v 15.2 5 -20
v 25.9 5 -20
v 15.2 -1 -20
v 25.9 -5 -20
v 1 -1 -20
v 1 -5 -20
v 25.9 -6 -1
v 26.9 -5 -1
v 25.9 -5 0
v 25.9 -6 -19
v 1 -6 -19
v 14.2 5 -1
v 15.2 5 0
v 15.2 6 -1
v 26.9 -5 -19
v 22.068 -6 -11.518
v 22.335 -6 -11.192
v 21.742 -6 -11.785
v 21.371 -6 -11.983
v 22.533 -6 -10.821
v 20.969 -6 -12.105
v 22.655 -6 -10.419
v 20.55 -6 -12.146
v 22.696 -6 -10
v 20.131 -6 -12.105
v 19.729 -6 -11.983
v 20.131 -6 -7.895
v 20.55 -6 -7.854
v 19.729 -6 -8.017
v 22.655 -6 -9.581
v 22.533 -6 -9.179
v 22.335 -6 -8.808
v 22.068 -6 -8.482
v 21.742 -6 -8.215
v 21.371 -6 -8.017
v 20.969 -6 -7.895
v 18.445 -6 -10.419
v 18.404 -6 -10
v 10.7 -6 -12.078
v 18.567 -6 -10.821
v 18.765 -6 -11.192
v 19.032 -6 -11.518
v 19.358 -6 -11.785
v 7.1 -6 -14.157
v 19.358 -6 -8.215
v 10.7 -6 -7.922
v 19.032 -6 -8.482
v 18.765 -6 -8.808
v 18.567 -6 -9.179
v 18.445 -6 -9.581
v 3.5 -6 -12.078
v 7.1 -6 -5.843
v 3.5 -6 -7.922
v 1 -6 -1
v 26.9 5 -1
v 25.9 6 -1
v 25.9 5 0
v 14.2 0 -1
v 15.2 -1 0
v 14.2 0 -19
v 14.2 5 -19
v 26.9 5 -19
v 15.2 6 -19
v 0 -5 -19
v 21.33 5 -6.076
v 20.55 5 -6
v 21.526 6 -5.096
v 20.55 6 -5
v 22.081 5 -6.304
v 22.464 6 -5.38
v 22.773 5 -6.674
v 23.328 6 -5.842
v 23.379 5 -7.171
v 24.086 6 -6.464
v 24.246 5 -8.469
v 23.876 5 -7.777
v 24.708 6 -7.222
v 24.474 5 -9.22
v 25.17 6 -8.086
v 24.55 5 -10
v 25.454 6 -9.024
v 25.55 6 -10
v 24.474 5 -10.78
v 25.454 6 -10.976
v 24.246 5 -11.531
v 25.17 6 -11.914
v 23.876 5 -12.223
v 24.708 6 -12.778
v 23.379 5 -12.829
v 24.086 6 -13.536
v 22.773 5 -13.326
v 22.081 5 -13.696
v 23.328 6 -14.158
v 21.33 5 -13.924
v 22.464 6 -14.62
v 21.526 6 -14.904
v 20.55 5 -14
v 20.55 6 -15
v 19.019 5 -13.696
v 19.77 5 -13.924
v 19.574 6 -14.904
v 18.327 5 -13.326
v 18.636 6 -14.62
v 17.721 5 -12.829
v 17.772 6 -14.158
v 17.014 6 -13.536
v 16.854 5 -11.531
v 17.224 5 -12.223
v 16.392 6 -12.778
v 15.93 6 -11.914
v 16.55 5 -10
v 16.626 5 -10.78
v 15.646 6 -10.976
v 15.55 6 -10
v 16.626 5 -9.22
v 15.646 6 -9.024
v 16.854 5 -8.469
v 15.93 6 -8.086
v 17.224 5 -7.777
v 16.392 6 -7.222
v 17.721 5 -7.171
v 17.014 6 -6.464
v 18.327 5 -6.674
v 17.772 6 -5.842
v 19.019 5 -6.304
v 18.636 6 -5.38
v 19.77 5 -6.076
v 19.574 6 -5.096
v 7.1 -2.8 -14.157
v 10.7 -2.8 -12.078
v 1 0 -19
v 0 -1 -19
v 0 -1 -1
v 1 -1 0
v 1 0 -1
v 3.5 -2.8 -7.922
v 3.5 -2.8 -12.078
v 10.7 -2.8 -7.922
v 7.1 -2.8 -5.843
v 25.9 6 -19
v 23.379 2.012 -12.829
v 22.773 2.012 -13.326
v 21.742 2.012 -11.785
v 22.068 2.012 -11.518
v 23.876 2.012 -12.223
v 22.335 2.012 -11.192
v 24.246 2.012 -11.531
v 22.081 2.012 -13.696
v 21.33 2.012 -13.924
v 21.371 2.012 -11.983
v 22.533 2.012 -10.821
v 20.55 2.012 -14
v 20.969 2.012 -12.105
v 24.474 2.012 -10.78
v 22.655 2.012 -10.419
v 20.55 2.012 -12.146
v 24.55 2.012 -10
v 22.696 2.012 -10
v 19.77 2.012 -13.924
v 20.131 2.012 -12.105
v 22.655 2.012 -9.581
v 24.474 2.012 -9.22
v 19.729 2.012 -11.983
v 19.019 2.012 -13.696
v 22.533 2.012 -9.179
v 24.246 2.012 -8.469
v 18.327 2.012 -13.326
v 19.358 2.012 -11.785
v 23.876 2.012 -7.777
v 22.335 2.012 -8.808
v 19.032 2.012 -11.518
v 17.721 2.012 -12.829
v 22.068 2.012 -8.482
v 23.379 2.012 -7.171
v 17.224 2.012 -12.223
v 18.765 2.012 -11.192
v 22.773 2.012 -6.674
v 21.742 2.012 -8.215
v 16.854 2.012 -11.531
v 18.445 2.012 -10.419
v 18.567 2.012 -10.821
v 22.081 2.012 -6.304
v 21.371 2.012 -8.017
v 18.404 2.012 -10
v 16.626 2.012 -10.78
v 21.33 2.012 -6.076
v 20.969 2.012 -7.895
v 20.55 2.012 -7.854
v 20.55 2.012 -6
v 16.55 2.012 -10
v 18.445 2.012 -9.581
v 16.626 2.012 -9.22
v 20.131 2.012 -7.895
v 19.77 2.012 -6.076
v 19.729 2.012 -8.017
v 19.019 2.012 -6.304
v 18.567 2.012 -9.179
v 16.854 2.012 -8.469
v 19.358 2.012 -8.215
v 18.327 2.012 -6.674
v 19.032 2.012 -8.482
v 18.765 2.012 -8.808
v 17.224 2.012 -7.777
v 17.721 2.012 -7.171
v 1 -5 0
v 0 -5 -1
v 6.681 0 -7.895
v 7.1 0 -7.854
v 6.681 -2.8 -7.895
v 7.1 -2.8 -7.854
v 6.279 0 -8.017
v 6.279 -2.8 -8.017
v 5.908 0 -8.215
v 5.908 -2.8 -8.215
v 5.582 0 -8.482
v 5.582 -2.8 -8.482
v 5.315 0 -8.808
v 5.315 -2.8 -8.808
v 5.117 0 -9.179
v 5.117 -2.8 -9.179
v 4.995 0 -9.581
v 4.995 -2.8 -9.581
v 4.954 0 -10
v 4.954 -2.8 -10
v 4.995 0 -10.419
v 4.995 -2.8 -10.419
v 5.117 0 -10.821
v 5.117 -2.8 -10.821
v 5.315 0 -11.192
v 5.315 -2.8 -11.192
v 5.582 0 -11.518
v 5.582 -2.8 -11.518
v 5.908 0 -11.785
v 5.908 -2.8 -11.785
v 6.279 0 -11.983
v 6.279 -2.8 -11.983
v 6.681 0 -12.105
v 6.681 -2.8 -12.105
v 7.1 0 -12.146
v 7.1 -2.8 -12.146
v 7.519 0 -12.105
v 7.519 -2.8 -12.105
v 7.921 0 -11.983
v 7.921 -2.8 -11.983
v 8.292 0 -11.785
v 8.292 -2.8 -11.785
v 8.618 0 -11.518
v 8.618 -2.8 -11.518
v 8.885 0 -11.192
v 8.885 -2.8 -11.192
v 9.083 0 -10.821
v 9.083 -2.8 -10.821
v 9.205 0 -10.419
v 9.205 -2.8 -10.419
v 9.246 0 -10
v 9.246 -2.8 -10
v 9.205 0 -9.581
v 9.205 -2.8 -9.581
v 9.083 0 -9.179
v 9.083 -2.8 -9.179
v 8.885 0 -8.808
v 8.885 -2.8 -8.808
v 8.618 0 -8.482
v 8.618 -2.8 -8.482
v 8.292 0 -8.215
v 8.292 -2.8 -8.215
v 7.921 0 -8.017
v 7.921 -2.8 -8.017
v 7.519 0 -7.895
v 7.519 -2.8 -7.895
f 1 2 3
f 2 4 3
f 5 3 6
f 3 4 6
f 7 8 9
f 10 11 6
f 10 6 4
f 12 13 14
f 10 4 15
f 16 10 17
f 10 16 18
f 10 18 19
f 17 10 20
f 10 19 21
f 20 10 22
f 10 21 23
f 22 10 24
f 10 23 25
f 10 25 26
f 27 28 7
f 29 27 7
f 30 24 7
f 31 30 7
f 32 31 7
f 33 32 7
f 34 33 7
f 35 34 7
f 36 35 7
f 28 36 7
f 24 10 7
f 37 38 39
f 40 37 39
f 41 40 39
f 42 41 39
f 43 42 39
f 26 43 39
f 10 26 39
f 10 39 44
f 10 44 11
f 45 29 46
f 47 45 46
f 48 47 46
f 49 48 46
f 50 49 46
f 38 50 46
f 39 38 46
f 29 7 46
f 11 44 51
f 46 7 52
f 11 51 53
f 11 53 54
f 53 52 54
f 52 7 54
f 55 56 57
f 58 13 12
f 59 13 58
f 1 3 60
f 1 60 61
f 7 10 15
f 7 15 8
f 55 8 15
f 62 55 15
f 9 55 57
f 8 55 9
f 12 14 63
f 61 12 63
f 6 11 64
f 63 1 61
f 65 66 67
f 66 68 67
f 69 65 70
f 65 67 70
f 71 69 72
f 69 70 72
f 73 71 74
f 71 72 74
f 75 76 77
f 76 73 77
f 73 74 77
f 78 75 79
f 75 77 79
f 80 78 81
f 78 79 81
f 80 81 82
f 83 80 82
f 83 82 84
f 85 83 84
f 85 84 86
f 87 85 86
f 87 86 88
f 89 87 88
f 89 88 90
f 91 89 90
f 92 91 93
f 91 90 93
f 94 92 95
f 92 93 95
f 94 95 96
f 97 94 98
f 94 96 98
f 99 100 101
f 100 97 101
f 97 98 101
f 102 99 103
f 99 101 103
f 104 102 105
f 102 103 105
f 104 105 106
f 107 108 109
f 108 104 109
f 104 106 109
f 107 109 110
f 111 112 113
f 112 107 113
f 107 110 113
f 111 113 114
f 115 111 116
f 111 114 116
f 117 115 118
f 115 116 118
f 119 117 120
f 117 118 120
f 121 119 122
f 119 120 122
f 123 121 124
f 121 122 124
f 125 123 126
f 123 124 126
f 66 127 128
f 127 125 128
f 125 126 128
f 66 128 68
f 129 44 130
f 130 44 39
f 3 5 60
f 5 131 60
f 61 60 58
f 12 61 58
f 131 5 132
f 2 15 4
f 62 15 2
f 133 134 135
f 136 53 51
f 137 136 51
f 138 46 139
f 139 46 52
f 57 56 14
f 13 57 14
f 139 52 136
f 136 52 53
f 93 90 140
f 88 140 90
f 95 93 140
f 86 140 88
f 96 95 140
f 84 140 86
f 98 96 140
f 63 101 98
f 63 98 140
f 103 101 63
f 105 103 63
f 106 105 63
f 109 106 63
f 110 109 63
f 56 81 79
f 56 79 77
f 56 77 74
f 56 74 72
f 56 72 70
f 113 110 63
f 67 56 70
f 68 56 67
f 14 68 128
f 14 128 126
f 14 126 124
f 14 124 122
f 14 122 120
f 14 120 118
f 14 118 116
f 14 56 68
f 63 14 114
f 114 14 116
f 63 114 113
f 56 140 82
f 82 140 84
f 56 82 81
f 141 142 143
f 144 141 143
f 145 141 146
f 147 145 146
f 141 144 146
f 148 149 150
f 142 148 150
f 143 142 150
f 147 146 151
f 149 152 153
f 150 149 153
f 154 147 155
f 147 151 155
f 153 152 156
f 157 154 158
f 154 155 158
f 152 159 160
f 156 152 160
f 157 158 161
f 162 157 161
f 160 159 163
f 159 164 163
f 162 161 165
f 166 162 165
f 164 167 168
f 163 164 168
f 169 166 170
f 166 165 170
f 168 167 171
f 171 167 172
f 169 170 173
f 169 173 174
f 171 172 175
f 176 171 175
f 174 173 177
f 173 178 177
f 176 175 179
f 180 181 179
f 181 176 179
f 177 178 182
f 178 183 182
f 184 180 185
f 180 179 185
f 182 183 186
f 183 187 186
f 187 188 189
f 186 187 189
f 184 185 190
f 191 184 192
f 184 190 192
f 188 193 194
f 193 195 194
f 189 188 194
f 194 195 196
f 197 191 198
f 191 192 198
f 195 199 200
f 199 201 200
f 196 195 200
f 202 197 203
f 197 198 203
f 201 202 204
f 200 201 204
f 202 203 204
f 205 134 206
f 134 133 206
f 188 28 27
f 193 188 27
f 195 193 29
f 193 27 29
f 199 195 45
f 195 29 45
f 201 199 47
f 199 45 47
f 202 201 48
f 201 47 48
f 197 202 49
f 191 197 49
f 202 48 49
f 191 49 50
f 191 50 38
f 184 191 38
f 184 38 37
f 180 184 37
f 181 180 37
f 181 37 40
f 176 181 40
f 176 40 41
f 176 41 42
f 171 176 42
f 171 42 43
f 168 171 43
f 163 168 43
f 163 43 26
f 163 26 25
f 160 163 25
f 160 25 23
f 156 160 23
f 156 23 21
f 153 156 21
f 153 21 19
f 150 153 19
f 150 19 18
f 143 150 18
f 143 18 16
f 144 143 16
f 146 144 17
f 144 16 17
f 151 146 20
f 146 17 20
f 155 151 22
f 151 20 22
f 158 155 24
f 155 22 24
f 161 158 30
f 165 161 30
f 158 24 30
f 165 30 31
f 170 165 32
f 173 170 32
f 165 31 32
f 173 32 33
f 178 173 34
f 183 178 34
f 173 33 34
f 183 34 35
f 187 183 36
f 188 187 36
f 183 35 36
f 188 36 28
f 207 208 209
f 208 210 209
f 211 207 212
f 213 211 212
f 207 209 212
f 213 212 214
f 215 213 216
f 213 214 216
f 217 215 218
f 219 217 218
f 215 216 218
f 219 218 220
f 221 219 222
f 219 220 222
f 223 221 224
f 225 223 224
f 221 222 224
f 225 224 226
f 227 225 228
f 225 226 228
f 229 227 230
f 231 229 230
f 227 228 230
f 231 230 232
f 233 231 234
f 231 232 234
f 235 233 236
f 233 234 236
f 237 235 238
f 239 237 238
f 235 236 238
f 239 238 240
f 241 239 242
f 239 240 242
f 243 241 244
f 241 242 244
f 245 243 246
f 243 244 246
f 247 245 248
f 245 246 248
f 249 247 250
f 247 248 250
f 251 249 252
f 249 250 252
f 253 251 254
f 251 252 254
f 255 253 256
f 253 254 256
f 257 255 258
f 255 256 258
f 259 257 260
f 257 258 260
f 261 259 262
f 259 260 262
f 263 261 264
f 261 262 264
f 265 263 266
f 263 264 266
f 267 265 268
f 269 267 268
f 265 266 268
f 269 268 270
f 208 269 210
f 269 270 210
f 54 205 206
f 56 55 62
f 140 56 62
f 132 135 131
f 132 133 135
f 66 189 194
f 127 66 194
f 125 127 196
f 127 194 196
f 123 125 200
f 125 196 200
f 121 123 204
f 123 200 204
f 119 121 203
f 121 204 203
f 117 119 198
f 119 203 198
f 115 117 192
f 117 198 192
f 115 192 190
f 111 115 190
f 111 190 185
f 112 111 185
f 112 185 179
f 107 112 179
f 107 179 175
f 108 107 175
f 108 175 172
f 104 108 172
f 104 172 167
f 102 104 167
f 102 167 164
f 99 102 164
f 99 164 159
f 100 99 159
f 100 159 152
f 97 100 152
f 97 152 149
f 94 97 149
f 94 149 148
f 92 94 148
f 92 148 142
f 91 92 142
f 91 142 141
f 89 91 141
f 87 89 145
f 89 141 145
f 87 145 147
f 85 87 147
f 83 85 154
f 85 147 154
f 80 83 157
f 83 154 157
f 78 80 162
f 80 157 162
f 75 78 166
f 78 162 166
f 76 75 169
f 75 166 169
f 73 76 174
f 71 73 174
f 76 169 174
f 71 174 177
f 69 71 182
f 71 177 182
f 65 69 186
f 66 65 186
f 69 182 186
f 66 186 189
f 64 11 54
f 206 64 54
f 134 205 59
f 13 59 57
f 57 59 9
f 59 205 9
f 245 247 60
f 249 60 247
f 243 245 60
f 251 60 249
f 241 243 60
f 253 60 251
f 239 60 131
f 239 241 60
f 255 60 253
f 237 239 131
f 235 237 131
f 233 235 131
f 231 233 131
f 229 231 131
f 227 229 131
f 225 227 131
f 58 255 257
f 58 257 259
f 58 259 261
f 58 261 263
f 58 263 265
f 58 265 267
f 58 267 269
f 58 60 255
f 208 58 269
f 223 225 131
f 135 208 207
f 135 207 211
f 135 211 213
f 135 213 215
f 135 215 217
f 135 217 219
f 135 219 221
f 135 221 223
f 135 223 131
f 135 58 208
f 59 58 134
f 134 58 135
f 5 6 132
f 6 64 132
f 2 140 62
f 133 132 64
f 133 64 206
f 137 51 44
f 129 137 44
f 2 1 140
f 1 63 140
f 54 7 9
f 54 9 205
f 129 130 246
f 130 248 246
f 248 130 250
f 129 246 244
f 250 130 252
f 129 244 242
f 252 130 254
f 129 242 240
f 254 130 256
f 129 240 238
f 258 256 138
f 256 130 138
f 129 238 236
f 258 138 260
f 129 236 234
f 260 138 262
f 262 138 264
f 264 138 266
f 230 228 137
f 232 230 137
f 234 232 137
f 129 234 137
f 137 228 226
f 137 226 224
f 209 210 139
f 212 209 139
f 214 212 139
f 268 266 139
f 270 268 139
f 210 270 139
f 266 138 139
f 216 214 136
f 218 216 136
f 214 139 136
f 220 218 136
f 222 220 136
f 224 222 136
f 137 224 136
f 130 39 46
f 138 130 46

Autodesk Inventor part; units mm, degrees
ref_plane "YZ Plane" through (0, 0, 0) normal (1, 0, 0) x (0, 1, 0)
ref_plane "XZ Plane" through (0, 0, 0) normal (0, 1, 0) x (-1, 0, 0)
ref_plane "XY Plane" through (0, 0, 0) normal (0, 0, 1) x (1, 0, 0)
sketch "Base Sketch" plane through (0, 0, 0) normal (0, 1, 0) x (-1, 0, 0)
  line L0 (0, 0) -> (-26.9, 0)
  line L1 (-26.9, 0) -> (-26.9, -20)
  line L2 (-26.9, -20) -> (0, -20)
  line L3 (0, -20) -> (0, 0)
  line L4 (-14.2, -20) -> (-14.2, 0)
  line L5 (-10.6, -7.9793) -> (-7.1, -5.9585)
  line L6 (-7.1, -5.9585) -> (-3.6, -7.9793)
  line L7 (-3.6, -7.9793) -> (-3.6, -12.0207)
  line L8 (-3.6, -12.0207) -> (-7.1, -14.0415)
  line L9 (-7.1, -14.0415) -> (-10.6, -12.0207)
  line L10 (-10.6, -12.0207) -> (-10.6, -7.9793)
  point P0 (-20.55, -10)
  point P1 (-26.9, -10)
  point P2 (-7.1, -10)
  point P3 (0, -10)
  point P4 (-7.1, -10)
  dimension "d0" = 20
  dimension "d5" = 14.2
  dimension "d7" = 6.35
  dimension "d8" = 6.35
  dimension "d25" = 7.1
  dimension "d36" = 7
extrude "BasePlate" add sketch "Base Sketch" against normal blind 6 contours L3 L2 L4 L0 | L4 L2 L1 L0 | L5 L6 L7 L8 L9 L10
hole "Load Screw Hole" at (7.1, 0, -10) direction (0, -1, 0) diameter 4.2926 end through all clearance for "Socket Head Cap Screw" size "M4" standard "Ansi Metric M Profile"
extrude "Top Section" add sketch "Base Sketch" along normal blind 6 contours L4 L2 L1 L0
sketch "Sketch2" plane through (0, 6, 0) normal (0, 1, 0) x (1, 0, 0)
  point P0 (20.55, 10)
hole "Extrusion Mount Screw" at (20.55, 6, -10) direction (0, -1, 0) diameter 4.2926 end through all counterbore diameter 8.001 counterbore depth 3.9878 clearance for "Socket Head Cap Screw" size "M4" standard "Ansi Metric M Profile"
chamfer "Chamfer" distance 1 angle 45 18 edges at (7.1, 0, -20) (14.2, 3, -20) (20.55, 6, -20) (26.9, 6, -10) (20.55, 6, 0) (14.2, 3, 0) (7.1, 0, 0) (0, -3, 0) (26.9, 0, 0) (26.9, 0, -20) (13.45, -6, -20) (26.9, -6, -10) (13.45, -6, 0) (0, -6, -10) (0, -3, -20) (0, 0, -10) (14.2, 6, -10) (20.55, 6, -14.0005)
extrude "Hex Nut Slot" cut sketch "Base Sketch" along normal blind 3.2 from surface at -6 contours L5 L6 L7 L8 L9 L10
thicken "Nut Fit Clearance" operation cut thickness 0.1 both sides no extend neighbours yes toward (-0.5, 0, 0.8660254) faces at (4.7667, -4.9333, -7.3057) (3.6, -4.9333, -10.6736) (5.9333, -4.9333, -13.3679) (9.4333, -4.9333, -12.6943) (10.6, -4.9333, -9.3264) (8.2667, -4.9333, -6.6321)
equation "\"d8\" = d7"
equation "\"d25\" = 0.5 * d5"
equation "\"d9\" = baseThickness"
equation "\"d22\" = chamferSize"
equation "\"baseThickness\" = 6"
equation "\"jawTravel\" = 3"
equation "\"M4_clearance_hole\" = 4.2"
equation "\"slotLength\" = M4_clearance_hole + jawTravel"
equation "\"chamferSize\" = 1"
properties material "ABS Plastic"
